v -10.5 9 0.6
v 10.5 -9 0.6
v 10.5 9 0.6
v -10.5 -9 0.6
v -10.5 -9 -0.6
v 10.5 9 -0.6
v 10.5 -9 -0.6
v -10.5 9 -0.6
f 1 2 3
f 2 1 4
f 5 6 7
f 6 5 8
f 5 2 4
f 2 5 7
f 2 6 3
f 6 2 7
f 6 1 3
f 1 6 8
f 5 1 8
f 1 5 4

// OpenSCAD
$fn=64;

module pcb(size_x=21.0, size_y=18.0, thickness=1.2) {
    cube([size_x, size_y, thickness], center=true);
}

pcb();
